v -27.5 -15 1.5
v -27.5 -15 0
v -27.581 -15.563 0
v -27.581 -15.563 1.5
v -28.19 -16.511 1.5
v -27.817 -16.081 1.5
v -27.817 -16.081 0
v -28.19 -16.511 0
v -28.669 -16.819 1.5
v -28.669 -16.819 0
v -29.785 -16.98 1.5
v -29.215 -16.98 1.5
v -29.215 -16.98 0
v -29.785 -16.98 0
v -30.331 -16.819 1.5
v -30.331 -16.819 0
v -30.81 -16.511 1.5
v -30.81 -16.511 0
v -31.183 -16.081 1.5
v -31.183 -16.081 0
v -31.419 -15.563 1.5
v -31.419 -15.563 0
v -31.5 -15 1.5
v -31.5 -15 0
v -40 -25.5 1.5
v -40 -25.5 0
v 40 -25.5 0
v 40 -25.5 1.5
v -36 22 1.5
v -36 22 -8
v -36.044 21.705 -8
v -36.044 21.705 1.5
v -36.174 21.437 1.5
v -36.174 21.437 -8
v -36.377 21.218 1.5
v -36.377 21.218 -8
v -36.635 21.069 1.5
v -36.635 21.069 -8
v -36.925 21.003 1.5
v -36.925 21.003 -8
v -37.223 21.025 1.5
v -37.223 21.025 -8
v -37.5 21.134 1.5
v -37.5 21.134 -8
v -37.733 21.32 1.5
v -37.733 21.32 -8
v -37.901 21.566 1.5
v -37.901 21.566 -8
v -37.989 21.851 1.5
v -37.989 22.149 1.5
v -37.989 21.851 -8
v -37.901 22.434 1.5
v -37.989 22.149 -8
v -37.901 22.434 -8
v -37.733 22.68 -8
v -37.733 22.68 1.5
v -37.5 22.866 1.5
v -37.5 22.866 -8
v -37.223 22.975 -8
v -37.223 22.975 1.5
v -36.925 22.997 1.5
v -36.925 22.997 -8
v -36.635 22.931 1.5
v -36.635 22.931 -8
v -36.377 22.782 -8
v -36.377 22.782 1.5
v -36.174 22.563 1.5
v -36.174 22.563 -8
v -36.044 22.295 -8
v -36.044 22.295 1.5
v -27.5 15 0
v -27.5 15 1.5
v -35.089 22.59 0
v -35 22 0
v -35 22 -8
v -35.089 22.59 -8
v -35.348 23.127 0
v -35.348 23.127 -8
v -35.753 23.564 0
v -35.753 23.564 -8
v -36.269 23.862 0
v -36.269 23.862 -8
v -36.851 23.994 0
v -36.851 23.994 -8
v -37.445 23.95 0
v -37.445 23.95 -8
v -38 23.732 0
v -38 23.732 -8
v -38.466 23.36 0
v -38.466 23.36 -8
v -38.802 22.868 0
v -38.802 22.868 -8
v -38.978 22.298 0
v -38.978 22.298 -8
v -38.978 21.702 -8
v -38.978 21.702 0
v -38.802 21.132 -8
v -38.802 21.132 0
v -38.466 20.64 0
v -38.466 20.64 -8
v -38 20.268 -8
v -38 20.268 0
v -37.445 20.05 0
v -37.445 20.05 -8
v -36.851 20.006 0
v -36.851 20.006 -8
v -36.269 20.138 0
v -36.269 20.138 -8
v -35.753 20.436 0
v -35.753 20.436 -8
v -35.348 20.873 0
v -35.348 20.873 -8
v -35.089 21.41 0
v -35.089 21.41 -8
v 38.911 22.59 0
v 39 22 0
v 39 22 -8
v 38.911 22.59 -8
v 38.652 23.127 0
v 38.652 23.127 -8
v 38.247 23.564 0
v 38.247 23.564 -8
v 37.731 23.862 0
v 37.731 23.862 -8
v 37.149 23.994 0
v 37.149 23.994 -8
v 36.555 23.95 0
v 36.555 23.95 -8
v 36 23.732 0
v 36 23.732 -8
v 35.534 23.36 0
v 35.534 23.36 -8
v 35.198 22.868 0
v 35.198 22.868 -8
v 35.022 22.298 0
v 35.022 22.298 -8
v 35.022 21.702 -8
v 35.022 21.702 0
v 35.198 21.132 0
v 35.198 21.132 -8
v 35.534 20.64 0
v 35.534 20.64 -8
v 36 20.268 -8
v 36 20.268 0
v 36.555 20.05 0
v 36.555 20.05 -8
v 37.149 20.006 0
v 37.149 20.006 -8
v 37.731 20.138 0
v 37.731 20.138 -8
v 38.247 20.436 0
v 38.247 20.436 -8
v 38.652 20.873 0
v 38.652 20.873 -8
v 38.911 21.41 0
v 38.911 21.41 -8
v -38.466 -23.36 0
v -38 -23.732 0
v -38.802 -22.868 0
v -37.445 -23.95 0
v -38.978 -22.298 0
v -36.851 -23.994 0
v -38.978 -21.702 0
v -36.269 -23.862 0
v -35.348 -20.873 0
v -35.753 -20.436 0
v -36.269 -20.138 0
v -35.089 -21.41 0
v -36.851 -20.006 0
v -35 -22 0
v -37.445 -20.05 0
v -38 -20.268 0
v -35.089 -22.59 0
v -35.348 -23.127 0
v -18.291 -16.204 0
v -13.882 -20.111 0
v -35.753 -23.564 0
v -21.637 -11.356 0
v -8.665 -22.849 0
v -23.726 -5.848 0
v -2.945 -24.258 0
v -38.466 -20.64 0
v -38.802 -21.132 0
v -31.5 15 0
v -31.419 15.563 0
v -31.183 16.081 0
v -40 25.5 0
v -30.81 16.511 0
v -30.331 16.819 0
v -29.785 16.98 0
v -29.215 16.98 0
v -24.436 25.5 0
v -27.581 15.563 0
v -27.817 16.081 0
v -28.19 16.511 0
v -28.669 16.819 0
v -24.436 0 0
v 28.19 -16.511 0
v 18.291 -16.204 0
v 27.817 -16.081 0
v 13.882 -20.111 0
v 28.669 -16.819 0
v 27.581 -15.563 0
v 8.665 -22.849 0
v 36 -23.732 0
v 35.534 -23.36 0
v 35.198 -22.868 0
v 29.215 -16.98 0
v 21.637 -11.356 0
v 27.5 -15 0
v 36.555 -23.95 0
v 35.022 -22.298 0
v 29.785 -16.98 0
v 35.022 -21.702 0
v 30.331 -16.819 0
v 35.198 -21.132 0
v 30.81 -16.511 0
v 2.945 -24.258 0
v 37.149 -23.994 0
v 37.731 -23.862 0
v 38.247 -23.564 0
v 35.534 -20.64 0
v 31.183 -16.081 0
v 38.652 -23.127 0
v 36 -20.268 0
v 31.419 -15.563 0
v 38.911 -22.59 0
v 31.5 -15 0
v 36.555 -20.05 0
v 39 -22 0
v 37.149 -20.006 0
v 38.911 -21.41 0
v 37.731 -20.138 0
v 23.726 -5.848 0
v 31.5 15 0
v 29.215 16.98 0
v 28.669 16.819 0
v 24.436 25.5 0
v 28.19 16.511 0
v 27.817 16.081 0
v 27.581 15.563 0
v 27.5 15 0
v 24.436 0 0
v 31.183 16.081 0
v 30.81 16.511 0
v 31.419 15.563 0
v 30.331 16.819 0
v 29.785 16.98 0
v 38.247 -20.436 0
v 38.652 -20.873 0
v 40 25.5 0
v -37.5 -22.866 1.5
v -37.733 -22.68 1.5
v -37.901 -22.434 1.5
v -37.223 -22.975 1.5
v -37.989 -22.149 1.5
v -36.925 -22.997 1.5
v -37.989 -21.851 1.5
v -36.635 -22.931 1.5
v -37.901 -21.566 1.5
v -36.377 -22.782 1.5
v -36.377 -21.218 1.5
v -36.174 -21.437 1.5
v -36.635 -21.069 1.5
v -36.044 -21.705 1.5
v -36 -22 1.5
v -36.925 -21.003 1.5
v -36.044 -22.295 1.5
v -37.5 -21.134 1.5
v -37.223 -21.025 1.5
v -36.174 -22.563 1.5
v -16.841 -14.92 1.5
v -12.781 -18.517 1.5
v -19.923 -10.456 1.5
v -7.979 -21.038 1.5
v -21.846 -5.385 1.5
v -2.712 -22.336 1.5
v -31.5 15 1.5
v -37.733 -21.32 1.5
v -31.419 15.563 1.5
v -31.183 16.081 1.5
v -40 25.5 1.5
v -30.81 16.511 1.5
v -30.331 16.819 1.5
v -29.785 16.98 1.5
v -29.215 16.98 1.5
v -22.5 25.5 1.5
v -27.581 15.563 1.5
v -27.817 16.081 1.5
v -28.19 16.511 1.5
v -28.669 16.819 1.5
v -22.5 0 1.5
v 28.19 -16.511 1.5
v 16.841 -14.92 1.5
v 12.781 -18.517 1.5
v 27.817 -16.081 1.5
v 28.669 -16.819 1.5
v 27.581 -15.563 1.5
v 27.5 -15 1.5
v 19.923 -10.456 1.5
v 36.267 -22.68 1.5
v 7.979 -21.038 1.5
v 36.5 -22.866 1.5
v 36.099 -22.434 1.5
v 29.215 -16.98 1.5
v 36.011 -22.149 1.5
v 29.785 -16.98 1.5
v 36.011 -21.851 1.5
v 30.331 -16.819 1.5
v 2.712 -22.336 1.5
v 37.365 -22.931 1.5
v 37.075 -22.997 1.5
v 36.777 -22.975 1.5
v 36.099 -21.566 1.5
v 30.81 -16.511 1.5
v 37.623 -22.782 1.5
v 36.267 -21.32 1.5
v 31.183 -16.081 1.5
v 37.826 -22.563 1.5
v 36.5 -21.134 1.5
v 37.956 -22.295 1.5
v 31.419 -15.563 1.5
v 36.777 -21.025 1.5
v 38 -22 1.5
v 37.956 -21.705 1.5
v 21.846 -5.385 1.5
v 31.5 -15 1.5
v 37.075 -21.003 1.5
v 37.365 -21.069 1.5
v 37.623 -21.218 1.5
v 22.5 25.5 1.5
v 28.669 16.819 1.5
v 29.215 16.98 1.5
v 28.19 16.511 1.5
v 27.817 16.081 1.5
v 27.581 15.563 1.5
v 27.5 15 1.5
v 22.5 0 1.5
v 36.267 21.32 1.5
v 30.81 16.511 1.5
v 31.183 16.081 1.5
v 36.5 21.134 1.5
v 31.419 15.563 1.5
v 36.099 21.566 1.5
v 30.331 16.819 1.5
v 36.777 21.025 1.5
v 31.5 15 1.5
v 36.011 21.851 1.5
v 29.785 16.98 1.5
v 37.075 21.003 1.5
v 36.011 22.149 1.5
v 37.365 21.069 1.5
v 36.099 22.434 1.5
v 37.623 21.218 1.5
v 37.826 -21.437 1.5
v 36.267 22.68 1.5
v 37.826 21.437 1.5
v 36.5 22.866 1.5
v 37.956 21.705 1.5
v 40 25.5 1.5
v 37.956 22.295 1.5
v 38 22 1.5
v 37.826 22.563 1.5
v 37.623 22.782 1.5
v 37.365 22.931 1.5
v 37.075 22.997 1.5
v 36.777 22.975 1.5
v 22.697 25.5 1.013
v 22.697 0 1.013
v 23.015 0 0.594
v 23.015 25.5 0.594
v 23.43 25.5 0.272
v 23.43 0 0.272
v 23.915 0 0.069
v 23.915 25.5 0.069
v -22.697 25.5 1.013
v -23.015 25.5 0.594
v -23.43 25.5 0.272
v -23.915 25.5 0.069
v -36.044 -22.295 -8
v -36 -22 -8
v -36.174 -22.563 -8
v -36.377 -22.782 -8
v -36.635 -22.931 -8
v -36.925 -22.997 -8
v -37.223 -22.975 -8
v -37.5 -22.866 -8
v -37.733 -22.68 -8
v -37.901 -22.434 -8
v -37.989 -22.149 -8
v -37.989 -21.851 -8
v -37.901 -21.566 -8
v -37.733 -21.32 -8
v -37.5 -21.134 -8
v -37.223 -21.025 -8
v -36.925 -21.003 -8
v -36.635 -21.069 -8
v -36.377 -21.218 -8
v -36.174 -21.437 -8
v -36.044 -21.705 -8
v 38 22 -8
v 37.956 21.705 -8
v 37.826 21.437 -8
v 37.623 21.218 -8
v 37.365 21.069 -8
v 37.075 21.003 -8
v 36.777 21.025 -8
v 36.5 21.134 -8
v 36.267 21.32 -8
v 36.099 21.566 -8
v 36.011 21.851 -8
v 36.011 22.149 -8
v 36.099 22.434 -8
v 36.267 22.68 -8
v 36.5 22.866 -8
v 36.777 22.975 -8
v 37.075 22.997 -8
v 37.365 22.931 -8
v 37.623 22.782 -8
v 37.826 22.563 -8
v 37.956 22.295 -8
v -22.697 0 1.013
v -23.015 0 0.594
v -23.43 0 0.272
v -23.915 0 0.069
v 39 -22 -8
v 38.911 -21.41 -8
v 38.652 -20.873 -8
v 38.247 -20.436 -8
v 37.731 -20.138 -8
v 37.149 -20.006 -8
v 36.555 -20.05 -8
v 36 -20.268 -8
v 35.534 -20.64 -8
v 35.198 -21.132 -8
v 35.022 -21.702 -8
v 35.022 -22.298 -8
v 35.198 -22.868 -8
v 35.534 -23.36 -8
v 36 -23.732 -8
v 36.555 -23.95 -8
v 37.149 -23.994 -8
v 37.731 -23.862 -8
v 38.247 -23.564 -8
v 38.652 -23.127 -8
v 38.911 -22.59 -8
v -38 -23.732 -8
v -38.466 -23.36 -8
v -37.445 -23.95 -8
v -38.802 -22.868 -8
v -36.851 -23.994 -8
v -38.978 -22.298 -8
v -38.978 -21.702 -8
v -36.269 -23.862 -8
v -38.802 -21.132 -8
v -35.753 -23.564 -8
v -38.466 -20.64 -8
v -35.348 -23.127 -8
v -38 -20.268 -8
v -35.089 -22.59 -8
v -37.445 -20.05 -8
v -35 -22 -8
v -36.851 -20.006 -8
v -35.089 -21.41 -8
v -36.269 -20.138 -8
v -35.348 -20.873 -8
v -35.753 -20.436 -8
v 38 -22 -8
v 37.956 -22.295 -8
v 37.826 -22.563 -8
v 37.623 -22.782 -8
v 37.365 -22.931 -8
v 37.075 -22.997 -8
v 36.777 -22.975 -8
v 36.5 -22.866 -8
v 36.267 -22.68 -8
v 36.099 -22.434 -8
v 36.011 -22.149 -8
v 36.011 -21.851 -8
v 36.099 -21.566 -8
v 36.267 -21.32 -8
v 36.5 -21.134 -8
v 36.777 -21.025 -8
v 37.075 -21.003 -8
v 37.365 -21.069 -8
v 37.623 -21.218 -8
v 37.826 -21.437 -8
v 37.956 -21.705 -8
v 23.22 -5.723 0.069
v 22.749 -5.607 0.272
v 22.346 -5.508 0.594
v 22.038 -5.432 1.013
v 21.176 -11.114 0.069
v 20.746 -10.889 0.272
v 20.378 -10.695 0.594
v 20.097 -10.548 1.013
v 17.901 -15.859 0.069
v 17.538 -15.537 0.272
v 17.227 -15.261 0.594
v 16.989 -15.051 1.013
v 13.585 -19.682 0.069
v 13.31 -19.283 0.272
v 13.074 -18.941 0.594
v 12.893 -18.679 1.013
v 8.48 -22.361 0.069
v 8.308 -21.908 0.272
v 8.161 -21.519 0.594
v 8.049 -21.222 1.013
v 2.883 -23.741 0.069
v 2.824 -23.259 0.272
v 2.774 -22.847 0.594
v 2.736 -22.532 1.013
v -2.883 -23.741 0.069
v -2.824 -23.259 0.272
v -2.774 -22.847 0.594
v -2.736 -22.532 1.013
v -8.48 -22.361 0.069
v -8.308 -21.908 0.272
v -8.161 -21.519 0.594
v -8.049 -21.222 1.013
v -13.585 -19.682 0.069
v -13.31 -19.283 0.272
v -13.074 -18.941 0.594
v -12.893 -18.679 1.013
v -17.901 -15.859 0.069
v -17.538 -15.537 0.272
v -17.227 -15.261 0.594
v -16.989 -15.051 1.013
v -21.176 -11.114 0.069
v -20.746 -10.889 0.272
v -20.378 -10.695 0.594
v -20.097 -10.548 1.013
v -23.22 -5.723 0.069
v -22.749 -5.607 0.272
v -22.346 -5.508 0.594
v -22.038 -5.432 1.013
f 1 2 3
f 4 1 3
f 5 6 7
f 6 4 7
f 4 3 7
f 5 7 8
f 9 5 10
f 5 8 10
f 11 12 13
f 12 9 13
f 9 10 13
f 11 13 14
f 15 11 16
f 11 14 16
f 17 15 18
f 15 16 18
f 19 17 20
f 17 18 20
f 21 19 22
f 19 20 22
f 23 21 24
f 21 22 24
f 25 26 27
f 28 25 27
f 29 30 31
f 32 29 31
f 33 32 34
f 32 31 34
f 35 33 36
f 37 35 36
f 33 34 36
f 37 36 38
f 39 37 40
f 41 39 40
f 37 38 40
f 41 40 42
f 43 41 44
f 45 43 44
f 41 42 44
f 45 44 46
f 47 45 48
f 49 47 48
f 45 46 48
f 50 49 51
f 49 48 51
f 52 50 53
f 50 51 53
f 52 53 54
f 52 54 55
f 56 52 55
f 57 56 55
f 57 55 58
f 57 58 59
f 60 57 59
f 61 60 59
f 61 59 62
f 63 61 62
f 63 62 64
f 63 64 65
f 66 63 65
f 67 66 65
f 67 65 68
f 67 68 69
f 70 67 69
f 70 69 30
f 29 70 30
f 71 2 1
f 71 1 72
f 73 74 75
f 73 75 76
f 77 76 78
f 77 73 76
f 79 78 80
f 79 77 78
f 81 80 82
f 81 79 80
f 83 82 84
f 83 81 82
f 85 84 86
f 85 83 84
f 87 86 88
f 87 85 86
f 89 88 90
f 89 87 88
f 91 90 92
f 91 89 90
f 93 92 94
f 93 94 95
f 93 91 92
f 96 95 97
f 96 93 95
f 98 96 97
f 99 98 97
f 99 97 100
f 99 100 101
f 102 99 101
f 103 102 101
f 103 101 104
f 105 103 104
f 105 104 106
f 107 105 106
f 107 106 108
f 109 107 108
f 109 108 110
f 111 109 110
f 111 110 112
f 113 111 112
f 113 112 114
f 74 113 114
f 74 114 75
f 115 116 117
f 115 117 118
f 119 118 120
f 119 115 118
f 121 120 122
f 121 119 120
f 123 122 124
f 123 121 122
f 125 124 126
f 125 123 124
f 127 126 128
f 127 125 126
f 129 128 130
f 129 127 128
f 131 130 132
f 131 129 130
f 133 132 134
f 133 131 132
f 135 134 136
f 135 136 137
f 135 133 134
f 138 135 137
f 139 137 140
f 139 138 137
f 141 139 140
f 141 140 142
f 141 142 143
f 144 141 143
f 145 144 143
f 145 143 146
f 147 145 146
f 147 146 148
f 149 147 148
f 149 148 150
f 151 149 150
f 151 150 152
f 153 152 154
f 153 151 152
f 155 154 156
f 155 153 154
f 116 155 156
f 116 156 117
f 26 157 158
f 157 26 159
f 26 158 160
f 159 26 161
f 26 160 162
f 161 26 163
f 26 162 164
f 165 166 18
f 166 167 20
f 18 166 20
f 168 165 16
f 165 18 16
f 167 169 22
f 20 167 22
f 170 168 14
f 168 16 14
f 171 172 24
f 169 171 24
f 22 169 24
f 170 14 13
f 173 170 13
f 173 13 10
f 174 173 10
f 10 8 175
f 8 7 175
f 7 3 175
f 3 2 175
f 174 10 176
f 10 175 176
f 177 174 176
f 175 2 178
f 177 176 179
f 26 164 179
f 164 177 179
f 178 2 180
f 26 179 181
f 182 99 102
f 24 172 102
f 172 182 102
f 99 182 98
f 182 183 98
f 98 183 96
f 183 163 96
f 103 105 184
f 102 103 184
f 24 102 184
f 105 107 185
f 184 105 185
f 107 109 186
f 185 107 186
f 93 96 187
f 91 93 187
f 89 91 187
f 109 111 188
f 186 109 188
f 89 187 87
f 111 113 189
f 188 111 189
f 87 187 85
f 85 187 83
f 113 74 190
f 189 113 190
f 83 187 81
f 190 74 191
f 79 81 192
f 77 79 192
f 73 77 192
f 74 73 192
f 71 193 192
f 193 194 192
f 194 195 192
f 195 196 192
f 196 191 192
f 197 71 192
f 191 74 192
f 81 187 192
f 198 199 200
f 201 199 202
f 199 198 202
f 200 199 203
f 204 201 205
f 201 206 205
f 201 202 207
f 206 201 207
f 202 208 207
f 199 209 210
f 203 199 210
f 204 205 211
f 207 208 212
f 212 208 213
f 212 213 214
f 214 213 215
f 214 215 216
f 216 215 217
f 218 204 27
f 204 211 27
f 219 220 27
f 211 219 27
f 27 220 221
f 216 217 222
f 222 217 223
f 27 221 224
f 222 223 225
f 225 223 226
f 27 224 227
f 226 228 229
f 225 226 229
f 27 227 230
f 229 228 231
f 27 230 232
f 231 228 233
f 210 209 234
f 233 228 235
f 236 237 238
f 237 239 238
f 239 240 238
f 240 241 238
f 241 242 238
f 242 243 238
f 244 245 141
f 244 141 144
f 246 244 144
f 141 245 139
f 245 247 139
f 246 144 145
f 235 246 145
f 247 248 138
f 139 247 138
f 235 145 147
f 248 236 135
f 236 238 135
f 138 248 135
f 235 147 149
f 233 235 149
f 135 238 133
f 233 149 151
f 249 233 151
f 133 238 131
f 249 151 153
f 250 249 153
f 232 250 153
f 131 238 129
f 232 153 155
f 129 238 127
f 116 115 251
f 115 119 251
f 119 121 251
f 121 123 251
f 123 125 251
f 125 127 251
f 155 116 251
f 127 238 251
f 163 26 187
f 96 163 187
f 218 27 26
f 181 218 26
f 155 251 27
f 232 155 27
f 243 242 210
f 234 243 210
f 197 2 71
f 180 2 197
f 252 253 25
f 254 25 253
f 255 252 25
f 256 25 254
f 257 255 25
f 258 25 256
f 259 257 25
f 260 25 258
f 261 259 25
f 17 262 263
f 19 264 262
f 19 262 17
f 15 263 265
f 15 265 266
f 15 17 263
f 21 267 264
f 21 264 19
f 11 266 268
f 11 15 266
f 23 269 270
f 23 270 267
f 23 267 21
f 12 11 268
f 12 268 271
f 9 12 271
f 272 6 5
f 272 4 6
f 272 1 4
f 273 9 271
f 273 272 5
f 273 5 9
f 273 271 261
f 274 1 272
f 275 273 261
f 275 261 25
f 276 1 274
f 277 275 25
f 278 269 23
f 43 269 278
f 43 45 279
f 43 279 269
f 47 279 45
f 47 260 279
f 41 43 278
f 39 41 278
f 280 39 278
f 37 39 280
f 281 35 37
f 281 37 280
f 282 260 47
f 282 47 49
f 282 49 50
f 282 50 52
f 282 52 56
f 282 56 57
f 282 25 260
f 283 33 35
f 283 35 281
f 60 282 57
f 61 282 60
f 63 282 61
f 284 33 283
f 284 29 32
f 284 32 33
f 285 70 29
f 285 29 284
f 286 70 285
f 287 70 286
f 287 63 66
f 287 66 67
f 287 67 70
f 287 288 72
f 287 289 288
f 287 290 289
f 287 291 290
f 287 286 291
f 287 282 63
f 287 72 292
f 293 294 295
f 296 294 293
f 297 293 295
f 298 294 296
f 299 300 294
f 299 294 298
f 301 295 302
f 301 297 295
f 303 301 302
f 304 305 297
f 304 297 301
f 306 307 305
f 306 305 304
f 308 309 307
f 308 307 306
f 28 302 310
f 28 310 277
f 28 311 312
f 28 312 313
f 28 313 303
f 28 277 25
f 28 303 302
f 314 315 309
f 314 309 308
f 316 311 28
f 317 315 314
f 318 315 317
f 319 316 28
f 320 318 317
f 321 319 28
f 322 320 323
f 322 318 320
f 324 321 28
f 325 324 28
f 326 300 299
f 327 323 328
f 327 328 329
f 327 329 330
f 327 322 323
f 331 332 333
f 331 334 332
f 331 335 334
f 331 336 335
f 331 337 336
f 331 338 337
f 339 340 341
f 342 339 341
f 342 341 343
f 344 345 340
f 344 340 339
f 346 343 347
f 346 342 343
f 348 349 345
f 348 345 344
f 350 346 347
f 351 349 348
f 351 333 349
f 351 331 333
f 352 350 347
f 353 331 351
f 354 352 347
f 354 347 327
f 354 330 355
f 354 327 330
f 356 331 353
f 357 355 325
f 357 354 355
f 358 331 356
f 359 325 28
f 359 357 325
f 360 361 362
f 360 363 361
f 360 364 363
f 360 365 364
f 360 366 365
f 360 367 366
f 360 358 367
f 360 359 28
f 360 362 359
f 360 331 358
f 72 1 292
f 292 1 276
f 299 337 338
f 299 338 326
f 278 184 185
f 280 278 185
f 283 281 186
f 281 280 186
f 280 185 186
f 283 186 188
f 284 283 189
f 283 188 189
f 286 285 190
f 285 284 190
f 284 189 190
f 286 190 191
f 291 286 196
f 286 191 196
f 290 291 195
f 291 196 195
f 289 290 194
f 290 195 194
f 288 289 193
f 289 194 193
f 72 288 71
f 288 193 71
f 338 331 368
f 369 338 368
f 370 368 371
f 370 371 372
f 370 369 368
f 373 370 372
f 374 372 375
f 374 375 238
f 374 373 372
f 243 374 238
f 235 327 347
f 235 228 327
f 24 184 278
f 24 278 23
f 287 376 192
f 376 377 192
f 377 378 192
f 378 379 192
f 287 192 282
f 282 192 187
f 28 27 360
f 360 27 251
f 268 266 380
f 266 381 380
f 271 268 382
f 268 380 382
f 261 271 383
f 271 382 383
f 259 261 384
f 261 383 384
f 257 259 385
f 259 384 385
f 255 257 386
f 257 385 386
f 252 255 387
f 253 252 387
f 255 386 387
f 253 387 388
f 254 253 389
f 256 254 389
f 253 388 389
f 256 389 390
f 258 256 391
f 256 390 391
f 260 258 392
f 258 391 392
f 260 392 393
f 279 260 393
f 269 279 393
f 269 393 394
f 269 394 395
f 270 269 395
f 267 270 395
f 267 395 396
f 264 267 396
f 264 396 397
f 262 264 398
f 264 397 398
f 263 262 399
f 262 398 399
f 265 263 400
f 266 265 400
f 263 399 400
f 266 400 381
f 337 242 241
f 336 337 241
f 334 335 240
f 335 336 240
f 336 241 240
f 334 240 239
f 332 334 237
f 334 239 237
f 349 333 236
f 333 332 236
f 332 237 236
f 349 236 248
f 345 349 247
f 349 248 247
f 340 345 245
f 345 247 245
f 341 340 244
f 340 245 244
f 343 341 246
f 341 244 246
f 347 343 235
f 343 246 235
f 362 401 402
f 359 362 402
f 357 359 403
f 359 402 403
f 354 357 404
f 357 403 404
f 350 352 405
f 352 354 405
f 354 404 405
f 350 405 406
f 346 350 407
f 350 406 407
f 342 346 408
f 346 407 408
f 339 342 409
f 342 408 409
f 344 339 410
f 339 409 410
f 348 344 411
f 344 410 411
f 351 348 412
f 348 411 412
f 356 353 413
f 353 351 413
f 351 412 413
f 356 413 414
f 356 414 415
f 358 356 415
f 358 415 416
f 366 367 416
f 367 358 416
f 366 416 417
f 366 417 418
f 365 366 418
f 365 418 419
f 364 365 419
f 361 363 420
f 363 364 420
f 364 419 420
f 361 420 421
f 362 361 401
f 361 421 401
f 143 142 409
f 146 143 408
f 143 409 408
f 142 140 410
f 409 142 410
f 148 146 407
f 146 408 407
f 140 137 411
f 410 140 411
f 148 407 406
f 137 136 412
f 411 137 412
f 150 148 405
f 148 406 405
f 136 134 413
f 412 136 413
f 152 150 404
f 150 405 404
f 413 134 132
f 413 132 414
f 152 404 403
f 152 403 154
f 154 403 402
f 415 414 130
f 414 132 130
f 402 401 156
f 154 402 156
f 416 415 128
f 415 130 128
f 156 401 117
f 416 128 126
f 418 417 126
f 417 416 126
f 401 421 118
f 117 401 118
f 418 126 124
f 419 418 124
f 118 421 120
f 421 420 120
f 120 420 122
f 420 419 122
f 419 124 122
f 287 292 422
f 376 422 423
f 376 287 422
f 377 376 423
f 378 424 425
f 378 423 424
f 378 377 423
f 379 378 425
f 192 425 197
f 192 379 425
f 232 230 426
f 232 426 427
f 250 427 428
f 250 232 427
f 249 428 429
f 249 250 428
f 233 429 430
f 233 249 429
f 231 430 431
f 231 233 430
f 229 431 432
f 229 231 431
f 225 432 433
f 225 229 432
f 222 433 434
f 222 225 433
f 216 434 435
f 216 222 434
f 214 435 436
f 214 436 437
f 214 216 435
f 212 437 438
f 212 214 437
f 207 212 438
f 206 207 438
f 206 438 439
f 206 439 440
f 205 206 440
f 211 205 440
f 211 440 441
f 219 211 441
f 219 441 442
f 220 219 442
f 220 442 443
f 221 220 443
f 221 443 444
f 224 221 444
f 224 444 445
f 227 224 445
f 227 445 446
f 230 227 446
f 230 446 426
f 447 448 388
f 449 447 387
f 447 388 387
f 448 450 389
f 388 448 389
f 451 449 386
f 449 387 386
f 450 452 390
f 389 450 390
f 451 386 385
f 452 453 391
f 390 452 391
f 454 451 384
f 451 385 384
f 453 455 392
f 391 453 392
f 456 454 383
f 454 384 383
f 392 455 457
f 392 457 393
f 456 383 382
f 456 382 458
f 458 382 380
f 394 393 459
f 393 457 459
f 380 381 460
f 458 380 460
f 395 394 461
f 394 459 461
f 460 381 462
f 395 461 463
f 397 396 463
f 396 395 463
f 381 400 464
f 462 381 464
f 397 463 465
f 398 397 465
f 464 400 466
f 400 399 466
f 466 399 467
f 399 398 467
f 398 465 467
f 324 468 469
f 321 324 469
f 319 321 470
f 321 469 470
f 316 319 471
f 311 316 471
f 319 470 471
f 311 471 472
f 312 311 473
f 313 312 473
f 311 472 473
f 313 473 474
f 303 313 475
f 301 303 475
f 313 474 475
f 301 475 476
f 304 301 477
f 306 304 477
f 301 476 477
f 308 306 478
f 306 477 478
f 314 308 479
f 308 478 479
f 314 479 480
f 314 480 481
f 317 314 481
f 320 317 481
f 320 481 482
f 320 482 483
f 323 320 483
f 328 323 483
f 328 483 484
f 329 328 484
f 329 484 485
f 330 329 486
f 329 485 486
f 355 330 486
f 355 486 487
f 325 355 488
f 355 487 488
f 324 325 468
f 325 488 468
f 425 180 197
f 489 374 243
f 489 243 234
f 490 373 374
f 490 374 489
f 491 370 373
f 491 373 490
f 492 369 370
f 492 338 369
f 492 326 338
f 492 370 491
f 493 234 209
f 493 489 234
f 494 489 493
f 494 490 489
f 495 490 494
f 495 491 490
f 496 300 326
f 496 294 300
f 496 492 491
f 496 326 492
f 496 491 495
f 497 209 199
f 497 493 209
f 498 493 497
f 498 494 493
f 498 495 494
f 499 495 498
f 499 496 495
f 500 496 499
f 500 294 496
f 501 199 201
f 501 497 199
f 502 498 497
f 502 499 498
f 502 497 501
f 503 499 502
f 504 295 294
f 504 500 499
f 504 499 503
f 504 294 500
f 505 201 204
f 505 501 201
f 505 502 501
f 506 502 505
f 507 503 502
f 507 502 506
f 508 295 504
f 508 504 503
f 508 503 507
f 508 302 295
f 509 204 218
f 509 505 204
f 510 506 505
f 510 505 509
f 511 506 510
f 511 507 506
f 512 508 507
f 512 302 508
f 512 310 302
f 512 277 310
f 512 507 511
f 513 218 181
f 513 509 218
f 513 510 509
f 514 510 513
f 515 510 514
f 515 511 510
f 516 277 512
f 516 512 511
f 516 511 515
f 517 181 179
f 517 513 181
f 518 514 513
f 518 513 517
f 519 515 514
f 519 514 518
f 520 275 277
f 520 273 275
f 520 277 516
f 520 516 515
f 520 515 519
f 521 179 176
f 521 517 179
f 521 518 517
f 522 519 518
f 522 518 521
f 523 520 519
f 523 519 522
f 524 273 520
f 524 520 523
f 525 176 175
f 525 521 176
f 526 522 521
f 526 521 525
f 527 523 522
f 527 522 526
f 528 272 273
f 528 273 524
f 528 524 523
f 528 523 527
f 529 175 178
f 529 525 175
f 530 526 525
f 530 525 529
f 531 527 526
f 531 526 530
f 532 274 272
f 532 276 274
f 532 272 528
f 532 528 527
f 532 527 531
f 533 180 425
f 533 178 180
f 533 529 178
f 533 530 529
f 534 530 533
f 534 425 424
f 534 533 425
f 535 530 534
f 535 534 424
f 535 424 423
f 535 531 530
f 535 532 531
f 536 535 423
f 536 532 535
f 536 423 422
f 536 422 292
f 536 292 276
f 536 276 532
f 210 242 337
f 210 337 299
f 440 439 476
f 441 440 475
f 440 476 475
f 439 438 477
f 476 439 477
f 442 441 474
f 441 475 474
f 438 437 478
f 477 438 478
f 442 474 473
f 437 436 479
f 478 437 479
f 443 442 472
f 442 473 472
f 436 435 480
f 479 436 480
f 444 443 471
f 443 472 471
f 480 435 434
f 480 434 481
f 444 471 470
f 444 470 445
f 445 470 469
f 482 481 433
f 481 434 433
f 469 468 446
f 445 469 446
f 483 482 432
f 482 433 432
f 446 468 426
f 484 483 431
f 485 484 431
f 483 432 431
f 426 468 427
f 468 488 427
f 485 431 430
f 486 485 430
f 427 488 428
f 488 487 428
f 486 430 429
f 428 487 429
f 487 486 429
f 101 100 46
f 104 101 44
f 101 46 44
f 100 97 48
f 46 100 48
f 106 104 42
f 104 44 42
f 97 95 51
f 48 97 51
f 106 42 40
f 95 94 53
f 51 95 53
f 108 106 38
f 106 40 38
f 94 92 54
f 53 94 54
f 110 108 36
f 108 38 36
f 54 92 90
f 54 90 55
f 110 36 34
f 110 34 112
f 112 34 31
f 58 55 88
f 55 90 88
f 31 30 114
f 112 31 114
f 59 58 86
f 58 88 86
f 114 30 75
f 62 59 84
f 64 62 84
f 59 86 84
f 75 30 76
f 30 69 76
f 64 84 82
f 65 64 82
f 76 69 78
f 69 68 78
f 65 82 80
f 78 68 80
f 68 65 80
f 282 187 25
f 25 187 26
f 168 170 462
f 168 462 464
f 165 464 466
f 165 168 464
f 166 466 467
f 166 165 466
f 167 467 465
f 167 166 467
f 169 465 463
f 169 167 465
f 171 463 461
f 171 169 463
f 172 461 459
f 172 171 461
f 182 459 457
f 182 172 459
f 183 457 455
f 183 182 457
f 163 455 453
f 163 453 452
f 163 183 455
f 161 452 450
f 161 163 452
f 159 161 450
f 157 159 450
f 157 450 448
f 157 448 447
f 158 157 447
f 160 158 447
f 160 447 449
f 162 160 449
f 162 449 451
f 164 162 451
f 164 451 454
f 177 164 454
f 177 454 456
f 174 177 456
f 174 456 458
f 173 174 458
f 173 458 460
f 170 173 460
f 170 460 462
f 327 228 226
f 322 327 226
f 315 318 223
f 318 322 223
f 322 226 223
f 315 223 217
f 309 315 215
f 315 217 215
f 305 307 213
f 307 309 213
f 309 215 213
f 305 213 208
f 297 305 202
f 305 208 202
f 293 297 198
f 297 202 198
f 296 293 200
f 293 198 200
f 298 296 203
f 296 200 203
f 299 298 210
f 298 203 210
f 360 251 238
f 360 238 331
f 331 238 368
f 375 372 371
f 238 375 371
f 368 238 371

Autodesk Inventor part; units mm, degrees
ref_plane "YZ Plane" through (0, 0, 0) normal (1, 0, 0) x (0, 1, 0)
ref_plane "XZ Plane" through (0, 0, 0) normal (0, 1, 0) x (-1, 0, 0)
ref_plane "XY Plane" through (0, 0, 0) normal (0, 0, 1) x (1, 0, 0)
sketch "Szkic1" plane through (0, 0, 0) normal (0, 0, 1) x (1, 0, 0)
  line L0 (-40, -25.5) -> (40, -25.5)
  line L1 (40, -25.5) -> (40, 25.5)
  line L2 (40, 25.5) -> (-40, 25.5)
  line L3 (-40, 25.5) -> (-40, -25.5)
  line L4 (22.5, 0) -> (22.5, 25.5)
  line L5 (22.5, 25.5) -> (-22.5, 25.5)
  line L6 (-22.5, -25.5) -> (22.5, -25.5)
  line L7 (-29.5, -15) -> (-29.5, 15) construction
  line L8 (-27.5, -15) -> (-27.5, 15)
  line L9 (-31.5, 15) -> (-31.5, -15)
  arc A0 (-31.5, -15) -> (-27.5, -15) centre (-29.5, -15) ccw
  arc A1 (-27.5, 15) -> (-31.5, 15) centre (-29.5, 15) ccw
  line L10 (29.5, -15) -> (29.5, 15) construction
  line L11 (31.5, -15) -> (31.5, 15)
  line L12 (27.5, 15) -> (27.5, -15)
  arc A2 (27.5, -15) -> (31.5, -15) centre (29.5, -15) ccw
  arc A3 (31.5, 15) -> (27.5, 15) centre (29.5, 15) ccw
  line L13 (27.5, 0) -> (29.5, 0)
  arc A4 (-22.5, 0) -> (22.5, 0) centre (0, 0) ccw
  line L14 (-22.5, 25.5) -> (-22.5, 0)
  line L15 (37, -22) -> (-37, -22)
  line L16 (-37, -22) -> (-37, 22)
  line L17 (-37, 22) -> (37, -22) construction
  line L18 (37, 22) -> (-37, -22) construction
  circle A5 centre (-37, -22) radius 1
  circle A6 centre (-37, -22) radius 2
  circle A7 centre (37, -22) radius 2
  circle A8 centre (37, -22) radius 1
  circle A9 centre (-37, 22) radius 2
  circle A10 centre (-37, 22) radius 1
  circle A11 centre (37, 22) radius 2
  circle A12 centre (37, 22) radius 1
  dimension "d1" = 51
  dimension "d14" = 4
  dimension "d15" = 15
  dimension "d16" = 4
  dimension "d26" = 44
  dimension "d27" = 2
  dimension "d28" = 4
  dimension "d31" = 74
  dimension "d34" = 44
extrude "Wyciągnięcie proste1" add sketch "Szkic1" along normal blind 1.5 contours L3 L2 L14 A4 L4 L1 L0 | A6 L16 A5 L15 | L15 A5 L16 A6 | A7 | A9 | A11
extrude "Wyciągnięcie proste2" add sketch "Szkic1" against normal blind 8 contours A6 L16 A5 L15 | L15 A5 L16 A6 | A7 | A9 | A11
fillet "Zaokrąglenie1" radius 2 3 edges at (-22.5, 12.75, 0) (22.5, 12.75, 0) (0, -22.5, 0)
properties part number "FrontHolder"
